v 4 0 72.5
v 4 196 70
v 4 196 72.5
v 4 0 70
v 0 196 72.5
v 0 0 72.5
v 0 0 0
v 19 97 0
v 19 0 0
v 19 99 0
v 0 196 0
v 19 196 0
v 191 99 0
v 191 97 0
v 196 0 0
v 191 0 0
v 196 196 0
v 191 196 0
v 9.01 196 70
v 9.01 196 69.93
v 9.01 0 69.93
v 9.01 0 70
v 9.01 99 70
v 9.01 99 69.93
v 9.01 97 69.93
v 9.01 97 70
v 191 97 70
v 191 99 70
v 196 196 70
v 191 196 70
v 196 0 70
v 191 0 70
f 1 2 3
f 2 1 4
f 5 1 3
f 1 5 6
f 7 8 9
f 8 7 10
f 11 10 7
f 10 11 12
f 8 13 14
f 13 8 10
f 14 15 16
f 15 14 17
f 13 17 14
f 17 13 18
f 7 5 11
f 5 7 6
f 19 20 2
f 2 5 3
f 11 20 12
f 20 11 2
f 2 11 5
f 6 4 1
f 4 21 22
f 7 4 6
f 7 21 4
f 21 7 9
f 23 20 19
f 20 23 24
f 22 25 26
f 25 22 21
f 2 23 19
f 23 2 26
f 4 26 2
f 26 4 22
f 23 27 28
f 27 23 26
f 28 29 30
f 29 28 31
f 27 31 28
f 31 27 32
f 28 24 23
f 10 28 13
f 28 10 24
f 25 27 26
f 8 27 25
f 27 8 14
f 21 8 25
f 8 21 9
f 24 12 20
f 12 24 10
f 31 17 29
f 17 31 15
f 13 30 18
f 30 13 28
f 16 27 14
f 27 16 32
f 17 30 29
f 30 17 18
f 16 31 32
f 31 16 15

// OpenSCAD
$fn = 50;

bleed = 0.01;

wall_thickness = 2;
inner_box_size = [196, 196, 72.5];

slope_base_width = 10;

campaign_book_size = [192, 190, 2];
campaign_book_ledge_length = 5;

card_tray_size = [
  campaign_book_size[0] - campaign_book_ledge_length * 2,
  inner_box_size[1],
  70,
];

ledge_gap = inner_box_size[0] - campaign_book_size[0];

module triangular_prism(width, height, depth) {
  translate([0, depth, 0]) {
    rotate([90, 0, 0]) {
      linear_extrude(depth) {
        polygon(
          [
            [0, 0],
            [width, 0],
            [0, height],
          ]
        );
      }
    }
  }
}

union() {
  cube([ledge_gap, inner_box_size[1], inner_box_size[2]]);

  translate([ledge_gap - bleed, 0, 0]) {
    cube([campaign_book_ledge_length + bleed * 2, inner_box_size[1], card_tray_size[2]]);
  }

  translate(
    [
      ledge_gap + campaign_book_ledge_length - bleed,
      (inner_box_size[1] - wall_thickness) / 2,
      0,
    ]
  ) {
    cube([card_tray_size[0] + bleed * 2, wall_thickness, card_tray_size[2]]);
  }

  translate([ledge_gap + campaign_book_ledge_length, 0, 0]) {
    triangular_prism(slope_base_width, card_tray_size[2], card_tray_size[1]);
  }

  translate(
    [
      ledge_gap + campaign_book_ledge_length + card_tray_size[0],
      0,
      0,
    ]
  ) {
    cube([campaign_book_ledge_length, inner_box_size[1], card_tray_size[2]]);
  }
}
